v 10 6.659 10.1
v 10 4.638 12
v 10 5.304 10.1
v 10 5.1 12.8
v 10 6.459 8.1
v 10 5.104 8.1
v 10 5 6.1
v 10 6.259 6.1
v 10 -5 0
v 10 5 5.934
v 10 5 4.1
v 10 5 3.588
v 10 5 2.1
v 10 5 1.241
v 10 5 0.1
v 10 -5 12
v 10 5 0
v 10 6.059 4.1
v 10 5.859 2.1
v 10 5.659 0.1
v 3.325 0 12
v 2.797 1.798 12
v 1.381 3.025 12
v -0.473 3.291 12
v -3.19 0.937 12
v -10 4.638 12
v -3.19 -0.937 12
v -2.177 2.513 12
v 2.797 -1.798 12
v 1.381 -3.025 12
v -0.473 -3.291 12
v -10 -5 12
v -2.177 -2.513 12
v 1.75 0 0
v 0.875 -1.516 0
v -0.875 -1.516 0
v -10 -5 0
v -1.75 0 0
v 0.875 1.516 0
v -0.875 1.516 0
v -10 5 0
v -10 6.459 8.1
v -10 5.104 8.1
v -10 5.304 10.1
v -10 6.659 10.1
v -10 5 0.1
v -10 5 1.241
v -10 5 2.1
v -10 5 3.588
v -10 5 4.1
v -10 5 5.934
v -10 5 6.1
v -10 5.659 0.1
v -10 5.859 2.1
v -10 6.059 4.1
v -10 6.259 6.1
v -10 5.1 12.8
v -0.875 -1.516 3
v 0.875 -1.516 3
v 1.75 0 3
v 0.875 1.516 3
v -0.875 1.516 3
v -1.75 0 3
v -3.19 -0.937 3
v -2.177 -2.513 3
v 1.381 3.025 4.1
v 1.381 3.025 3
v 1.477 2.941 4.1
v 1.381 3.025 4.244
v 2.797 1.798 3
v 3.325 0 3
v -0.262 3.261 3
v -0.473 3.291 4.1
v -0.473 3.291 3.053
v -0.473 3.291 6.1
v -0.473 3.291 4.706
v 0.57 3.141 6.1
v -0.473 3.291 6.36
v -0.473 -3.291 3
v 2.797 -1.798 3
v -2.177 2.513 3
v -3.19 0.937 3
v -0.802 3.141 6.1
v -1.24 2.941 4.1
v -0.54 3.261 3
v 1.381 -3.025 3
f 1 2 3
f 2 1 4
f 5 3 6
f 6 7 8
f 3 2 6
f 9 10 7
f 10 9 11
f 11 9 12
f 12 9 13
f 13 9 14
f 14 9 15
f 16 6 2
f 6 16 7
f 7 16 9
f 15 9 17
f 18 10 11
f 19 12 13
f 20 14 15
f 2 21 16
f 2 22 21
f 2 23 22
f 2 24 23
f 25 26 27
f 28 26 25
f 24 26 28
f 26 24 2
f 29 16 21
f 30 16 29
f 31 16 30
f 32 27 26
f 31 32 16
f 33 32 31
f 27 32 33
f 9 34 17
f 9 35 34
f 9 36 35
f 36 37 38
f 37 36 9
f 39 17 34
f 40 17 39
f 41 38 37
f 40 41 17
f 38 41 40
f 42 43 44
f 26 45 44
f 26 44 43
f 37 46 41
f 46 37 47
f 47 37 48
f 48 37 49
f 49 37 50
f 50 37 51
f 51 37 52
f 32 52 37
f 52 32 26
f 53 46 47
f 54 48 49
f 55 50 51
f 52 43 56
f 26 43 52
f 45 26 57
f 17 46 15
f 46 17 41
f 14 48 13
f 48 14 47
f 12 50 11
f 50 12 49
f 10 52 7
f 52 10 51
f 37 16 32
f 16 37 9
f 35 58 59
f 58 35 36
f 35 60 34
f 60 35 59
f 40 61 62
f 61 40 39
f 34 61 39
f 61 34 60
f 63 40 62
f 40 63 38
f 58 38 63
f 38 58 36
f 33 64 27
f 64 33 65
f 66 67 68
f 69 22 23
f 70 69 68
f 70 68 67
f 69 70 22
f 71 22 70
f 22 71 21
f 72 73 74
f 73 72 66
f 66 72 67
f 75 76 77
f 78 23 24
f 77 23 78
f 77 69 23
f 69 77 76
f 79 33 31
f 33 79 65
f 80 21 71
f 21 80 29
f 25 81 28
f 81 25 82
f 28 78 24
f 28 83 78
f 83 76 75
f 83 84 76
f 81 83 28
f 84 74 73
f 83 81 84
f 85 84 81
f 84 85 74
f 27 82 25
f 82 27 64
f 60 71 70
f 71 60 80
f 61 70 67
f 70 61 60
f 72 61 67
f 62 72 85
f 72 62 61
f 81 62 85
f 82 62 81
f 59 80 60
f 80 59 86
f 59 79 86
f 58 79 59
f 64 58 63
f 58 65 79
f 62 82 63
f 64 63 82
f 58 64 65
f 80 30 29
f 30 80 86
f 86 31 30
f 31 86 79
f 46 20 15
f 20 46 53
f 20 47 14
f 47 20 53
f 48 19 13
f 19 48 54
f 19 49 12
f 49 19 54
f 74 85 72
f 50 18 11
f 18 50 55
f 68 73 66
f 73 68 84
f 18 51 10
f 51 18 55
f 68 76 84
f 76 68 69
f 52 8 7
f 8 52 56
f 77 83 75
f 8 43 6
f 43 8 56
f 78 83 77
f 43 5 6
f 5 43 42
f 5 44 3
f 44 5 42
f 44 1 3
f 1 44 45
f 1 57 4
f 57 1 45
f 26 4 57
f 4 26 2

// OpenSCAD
screw_hole_dia = 3.5;
height = 12;

difference(){
    translate([-10,-5,0]) cube([20,10,height]); 
    cylinder(r=screw_hole_dia / 2, h = height); 
    translate([0,0,3]) cylinder(r=screw_hole_dia * 0.95, h = height);
}
for (i=[1:2:height])
translate([-10,4+i/10,i]) mirror([0,0,1]) rotate([0,90,0]) cylinder(r=1.8, h=20, $fn = 2);
